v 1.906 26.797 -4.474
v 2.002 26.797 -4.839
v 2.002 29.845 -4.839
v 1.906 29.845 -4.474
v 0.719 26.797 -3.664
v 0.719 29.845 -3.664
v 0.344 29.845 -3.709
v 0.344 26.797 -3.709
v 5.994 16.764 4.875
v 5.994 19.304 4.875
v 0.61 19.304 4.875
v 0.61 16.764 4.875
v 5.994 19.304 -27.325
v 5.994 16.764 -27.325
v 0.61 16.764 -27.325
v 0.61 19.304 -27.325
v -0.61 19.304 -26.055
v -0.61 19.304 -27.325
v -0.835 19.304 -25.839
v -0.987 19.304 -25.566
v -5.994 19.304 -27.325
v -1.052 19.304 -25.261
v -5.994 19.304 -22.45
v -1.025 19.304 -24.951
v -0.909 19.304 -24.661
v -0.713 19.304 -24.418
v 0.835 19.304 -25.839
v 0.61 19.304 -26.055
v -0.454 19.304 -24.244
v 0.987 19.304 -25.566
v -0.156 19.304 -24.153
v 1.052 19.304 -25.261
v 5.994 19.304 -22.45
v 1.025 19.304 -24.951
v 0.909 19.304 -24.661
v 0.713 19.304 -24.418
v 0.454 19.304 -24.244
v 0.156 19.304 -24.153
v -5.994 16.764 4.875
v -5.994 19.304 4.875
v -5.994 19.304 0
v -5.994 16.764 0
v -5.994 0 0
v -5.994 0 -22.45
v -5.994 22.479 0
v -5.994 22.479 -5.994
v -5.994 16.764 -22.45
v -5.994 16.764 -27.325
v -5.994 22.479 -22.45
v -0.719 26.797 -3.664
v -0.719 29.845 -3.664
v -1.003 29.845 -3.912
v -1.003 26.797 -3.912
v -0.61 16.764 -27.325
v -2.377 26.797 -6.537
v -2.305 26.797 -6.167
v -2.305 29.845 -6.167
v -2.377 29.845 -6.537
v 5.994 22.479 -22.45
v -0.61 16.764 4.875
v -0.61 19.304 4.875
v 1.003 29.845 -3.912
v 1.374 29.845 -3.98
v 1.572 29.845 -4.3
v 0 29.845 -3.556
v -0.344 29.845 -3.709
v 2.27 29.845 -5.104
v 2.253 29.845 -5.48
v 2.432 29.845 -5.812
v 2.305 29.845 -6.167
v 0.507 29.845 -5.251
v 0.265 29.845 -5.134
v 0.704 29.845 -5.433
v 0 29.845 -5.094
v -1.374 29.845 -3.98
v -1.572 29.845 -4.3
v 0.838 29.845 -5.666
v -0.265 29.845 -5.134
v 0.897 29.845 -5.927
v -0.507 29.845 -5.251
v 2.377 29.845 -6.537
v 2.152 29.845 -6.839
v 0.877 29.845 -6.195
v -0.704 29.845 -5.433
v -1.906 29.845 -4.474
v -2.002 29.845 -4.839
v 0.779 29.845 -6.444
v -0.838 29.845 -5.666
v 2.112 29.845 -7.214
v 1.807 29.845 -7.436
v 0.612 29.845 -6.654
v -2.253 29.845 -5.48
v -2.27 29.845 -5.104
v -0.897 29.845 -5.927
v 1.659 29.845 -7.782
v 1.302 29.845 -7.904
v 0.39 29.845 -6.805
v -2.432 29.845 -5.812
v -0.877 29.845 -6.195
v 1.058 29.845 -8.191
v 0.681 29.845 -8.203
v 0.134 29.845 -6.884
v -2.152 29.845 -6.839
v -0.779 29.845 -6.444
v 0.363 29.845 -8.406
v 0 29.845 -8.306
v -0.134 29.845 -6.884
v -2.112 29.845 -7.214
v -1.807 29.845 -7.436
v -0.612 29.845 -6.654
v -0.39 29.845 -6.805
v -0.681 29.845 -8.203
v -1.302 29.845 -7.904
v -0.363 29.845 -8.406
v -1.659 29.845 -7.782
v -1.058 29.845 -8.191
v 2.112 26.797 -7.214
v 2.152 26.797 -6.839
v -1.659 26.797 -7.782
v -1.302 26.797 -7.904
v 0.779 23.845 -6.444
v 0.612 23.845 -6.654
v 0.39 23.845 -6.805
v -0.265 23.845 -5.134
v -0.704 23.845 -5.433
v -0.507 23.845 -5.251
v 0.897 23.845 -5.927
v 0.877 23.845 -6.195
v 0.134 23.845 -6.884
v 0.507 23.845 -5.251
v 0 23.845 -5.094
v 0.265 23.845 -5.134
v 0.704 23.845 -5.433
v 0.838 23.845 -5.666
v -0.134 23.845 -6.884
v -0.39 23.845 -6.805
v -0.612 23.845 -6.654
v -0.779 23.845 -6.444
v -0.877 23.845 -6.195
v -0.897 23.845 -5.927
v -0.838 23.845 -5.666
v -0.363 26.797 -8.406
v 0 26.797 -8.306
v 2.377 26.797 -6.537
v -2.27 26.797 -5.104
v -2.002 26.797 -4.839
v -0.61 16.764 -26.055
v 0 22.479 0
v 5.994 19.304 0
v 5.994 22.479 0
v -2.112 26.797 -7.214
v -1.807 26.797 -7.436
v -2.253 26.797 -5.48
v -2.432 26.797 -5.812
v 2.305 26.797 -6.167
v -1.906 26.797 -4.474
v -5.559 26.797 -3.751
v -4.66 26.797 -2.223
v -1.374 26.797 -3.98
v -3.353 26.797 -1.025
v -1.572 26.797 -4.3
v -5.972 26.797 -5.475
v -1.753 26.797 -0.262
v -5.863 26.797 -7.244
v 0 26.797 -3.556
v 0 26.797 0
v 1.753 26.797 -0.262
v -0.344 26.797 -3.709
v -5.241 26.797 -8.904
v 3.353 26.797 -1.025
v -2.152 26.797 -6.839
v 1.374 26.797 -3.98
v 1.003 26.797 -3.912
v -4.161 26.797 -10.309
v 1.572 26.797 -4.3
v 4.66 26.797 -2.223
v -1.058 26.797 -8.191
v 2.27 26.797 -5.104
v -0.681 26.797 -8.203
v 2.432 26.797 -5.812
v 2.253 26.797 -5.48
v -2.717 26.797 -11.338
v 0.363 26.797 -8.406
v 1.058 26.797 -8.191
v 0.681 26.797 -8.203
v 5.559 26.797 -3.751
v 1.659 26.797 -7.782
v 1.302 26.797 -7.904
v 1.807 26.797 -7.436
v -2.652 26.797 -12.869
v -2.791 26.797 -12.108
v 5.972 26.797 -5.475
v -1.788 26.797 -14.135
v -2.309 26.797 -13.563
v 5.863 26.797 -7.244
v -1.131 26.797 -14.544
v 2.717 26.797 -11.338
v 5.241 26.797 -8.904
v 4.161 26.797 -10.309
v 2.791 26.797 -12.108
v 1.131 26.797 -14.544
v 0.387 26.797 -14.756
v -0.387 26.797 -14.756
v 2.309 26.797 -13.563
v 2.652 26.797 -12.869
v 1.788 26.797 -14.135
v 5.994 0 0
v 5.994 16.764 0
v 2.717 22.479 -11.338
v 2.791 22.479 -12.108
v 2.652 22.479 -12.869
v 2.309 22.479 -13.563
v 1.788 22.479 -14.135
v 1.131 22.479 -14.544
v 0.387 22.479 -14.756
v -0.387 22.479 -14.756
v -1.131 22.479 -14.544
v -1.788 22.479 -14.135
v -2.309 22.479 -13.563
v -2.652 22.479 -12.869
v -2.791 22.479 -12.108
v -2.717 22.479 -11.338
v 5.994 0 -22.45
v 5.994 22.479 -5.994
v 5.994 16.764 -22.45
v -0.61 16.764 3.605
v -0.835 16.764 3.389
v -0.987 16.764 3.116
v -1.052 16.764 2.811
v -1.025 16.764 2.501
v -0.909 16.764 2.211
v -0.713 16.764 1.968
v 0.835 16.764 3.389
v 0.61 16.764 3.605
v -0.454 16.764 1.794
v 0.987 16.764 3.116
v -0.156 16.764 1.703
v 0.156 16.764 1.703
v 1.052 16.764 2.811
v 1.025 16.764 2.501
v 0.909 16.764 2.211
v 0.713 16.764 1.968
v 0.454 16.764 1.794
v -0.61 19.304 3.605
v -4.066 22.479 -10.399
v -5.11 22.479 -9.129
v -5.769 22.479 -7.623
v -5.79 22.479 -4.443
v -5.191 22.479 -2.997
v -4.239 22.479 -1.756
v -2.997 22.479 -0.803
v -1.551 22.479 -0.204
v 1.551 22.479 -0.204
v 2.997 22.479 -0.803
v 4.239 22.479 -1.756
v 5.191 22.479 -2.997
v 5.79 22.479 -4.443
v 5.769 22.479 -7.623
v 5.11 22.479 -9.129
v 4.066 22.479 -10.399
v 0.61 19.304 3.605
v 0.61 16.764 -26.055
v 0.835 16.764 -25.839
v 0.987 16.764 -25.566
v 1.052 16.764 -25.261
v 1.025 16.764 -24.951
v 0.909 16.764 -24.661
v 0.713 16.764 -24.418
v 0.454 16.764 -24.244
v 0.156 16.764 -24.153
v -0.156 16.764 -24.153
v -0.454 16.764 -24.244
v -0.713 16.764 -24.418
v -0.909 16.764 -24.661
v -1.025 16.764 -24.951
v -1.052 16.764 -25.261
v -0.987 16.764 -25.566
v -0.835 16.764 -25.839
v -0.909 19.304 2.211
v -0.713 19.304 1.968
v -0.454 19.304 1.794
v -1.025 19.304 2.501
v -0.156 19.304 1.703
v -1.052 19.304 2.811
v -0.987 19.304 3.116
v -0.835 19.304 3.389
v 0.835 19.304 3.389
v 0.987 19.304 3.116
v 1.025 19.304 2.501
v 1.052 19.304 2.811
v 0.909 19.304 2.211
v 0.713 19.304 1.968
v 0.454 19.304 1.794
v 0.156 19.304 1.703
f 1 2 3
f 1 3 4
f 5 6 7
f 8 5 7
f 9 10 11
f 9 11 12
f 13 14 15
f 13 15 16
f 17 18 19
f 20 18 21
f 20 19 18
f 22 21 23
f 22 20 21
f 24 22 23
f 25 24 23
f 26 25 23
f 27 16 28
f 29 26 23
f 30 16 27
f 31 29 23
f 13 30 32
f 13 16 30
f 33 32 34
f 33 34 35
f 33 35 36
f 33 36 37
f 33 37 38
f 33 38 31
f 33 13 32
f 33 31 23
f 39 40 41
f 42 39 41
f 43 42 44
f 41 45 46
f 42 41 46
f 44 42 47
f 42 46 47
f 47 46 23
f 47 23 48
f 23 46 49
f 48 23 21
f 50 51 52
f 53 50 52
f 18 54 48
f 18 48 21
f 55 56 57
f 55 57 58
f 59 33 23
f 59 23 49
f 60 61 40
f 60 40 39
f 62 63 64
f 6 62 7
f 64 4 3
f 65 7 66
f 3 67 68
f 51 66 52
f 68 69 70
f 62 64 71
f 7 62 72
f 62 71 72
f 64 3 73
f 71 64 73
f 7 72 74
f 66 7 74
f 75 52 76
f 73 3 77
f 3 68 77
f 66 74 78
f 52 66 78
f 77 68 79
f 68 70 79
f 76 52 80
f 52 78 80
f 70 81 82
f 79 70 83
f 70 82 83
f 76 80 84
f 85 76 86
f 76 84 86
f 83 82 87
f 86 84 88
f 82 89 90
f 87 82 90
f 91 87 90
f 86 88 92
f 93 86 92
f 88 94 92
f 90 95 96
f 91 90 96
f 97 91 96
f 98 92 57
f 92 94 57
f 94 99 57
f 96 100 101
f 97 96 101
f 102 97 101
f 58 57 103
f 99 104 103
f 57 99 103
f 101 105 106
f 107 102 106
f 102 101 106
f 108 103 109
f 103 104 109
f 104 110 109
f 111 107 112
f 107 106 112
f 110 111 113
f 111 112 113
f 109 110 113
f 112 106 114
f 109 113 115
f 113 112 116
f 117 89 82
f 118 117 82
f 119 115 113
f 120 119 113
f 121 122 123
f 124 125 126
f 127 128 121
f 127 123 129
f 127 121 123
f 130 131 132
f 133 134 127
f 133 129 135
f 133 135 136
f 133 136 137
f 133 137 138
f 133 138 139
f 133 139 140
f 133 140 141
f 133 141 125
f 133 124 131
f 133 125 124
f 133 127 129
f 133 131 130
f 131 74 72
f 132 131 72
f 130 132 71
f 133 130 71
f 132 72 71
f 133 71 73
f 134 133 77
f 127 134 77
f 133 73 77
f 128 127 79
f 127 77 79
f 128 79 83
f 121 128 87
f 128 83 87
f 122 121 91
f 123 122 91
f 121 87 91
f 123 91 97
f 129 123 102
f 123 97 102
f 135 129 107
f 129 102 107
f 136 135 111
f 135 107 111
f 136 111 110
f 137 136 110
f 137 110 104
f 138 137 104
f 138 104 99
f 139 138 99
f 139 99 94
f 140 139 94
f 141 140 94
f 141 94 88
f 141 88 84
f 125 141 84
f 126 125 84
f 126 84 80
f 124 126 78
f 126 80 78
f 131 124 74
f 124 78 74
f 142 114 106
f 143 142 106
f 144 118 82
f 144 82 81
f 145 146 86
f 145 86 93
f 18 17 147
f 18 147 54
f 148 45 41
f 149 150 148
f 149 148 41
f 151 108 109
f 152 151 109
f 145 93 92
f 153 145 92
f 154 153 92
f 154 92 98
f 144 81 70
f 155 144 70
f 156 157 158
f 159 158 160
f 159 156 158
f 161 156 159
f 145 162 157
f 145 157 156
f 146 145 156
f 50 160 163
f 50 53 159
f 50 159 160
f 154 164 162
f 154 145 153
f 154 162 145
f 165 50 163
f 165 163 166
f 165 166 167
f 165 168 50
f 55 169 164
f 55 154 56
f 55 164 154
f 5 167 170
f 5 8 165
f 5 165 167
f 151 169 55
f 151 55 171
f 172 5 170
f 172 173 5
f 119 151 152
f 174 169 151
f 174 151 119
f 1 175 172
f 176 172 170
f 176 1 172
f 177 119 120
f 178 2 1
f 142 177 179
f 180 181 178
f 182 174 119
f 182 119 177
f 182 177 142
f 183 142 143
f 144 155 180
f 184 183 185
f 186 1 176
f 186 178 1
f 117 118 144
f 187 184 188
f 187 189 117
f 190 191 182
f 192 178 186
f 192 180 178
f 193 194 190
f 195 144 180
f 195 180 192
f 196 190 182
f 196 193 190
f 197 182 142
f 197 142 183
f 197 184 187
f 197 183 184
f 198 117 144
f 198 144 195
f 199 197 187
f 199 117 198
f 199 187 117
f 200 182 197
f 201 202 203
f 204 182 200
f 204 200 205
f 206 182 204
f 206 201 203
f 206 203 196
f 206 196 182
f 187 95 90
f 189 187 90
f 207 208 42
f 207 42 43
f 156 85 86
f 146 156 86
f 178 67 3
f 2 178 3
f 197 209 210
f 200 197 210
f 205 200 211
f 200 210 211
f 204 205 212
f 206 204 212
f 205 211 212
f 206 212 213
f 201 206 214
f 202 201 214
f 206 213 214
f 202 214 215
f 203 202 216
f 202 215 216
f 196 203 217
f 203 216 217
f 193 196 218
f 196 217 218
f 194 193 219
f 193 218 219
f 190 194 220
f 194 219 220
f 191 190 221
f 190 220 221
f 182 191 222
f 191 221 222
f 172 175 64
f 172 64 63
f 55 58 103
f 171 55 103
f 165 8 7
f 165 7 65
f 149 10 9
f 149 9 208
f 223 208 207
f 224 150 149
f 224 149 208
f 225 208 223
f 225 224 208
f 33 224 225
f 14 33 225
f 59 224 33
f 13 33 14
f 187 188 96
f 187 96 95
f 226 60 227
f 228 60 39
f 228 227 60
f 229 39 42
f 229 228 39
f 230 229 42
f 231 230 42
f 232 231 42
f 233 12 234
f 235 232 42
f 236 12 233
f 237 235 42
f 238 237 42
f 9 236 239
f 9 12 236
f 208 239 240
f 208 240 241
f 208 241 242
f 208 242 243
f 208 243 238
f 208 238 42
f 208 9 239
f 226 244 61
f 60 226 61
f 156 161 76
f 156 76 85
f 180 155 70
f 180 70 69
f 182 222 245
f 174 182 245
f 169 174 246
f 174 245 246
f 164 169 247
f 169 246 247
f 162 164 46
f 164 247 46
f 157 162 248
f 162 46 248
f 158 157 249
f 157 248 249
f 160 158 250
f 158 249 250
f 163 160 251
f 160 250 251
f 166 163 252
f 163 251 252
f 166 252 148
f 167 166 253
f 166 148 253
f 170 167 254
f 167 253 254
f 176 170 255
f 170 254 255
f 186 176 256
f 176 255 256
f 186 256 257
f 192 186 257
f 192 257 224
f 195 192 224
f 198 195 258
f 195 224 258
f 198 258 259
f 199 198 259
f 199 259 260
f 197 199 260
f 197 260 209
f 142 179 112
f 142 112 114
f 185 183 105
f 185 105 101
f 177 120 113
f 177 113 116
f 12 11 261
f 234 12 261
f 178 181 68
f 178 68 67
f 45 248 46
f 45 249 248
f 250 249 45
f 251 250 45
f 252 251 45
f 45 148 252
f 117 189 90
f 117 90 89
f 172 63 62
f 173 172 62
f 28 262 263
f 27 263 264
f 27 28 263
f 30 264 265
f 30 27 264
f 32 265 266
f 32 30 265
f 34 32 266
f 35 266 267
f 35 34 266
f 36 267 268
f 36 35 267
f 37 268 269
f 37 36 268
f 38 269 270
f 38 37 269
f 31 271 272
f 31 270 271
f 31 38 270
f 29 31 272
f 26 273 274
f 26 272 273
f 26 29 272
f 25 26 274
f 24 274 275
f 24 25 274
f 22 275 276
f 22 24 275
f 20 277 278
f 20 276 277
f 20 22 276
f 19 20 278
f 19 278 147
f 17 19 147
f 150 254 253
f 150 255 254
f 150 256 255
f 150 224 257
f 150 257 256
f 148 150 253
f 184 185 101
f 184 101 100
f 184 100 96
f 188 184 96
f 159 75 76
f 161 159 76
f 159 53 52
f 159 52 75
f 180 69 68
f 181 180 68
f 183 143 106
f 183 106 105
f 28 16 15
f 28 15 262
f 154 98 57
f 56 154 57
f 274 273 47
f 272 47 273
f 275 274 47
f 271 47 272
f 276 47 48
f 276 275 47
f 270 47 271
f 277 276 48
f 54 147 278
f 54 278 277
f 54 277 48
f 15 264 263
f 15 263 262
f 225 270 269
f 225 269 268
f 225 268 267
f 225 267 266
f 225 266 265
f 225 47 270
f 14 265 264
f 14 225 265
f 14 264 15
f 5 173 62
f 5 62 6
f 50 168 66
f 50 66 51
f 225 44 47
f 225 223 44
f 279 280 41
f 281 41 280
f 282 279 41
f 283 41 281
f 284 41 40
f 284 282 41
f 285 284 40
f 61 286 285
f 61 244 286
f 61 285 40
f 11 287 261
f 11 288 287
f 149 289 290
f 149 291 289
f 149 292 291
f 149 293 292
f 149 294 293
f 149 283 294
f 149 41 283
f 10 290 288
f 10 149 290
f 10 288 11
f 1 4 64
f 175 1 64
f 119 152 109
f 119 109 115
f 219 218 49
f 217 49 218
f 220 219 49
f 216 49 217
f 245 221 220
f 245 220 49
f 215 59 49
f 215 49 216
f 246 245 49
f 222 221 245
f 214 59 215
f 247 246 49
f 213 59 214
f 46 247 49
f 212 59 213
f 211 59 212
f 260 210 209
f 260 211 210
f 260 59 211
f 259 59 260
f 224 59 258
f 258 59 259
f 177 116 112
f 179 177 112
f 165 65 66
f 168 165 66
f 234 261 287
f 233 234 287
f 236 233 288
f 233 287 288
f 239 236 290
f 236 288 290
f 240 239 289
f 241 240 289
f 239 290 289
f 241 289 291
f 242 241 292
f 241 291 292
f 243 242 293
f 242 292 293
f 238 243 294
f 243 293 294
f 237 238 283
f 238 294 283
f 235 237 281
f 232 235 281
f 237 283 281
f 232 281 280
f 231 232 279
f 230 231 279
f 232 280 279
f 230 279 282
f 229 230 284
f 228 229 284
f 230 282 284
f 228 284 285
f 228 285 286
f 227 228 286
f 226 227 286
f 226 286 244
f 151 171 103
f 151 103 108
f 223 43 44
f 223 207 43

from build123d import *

# Parameters (mm, degrees)
BOSS_EXTRUDE1_DEPTH = 5.9944
BOSS_EXTRUDE2_DEPTH = 4.318
BOSS_EXTRUDE3_DEPTH = 3.048
CIRPATTERN1_COUNT   = 21
SKETCH4_R           = 0.9
CUT_EXTRUDE1_DEPTH  = 6
CUT_EXTRUDE2_REACH  = 35.989


with BuildPart() as part:
    # Sketch1 → Boss-Extrude1 (new, symmetric)
    with BuildSketch(Plane(origin=(0, 0, 0), x_dir=(0, 0, -1), z_dir=(1, 0, 0))):
        Polygon((22.45, 16.764), (27.325, 16.764), (27.325, 19.304), (22.45, 19.304), (22.45, 22.479), (0, 22.479), (0, 19.304), (-4.875, 19.304), (-4.875, 16.764), (0, 16.764), (0, 0), (22.45, 0), align=None)
    extrude(amount=BOSS_EXTRUDE1_DEPTH, both=True)

    # Sketch2 → Boss-Extrude2 (add)
    with BuildSketch(Plane(origin=(0, 22.479, 0), x_dir=(1, 0, 0), z_dir=(0, 1, 0))):
        with BuildLine():
            ThreePointArc((-2.717065955, 11.337655932), (0, 0), (2.717065955, 11.337655932))
            ThreePointArc((2.717065955, 11.337655932), (0, 14.7828), (-2.717065955, 11.337655932))
        make_face()
    extrude(amount=BOSS_EXTRUDE2_DEPTH)

    # Sketch3 → Boss-Extrude3 (add)
    with BuildSketch(Plane(origin=(0, 26.797, 0), x_dir=(1, 0, 0), z_dir=(0, 1, 0))):
        Polygon((0, 5.9944), (0, 8.3058), (0.363424662, 8.405565087), (0.68129711, 8.203110983), align=None)
    boss_extrude3 = extrude(amount=BOSS_EXTRUDE3_DEPTH)

    # CirPattern1: Boss-Extrude3 ×21 about axis
    cirpattern1_axis = Axis((0, 0, -5.9944), (0, 1, 0))
    for i in range(1, CIRPATTERN1_COUNT):
        add(boss_extrude3.rotate(cirpattern1_axis, i * 360 / CIRPATTERN1_COUNT))

    # Sketch4 → Cut-Extrude1 (cut)
    with BuildSketch(Plane(origin=(0, 29.845, 0), x_dir=(1, 0, 0), z_dir=(0, 1, 0))):
        with Locations(Location((0, 5.9944, 0), (0, 0, 270))):
            Circle(SKETCH4_R)
    extrude(amount=-CUT_EXTRUDE1_DEPTH, mode=Mode.SUBTRACT)

    # Sketch5 → Cut-Extrude2 (cut, up to next)
    with BuildSketch(Plane(origin=(0, 19.304, 0), x_dir=(1, 0, 0), z_dir=(0, 1, 0)), mode=Mode.PRIVATE) as cut_extrude2_sk1:
        with BuildLine():
            Line((-0.6096, 26.054950376), (-0.6096, 27.325))
            Line((-0.6096, 27.325), (0.6096, 27.325))
            Line((0.6096, 27.325), (0.6096, 26.054950376))
            ThreePointArc((0.6096, 26.054950376), (0, 24.1409), (-0.6096, 26.054950376))
        make_face()
    cut_extrude2_tool1 = extrude(cut_extrude2_sk1.sketch, amount=-CUT_EXTRUDE2_REACH, mode=Mode.PRIVATE) & part.part
    # Sketch5 → Cut-Extrude2 (cut, up to next)
    with BuildSketch(Plane(origin=(0, 19.304, 0), x_dir=(1, 0, 0), z_dir=(0, 1, 0)), mode=Mode.PRIVATE) as cut_extrude2_sk2:
        with BuildLine():
            Line((-0.6096, -4.875), (0.6096, -4.875))
            Line((0.6096, -4.875), (0.6096, -3.604950376))
            ThreePointArc((0.6096, -3.604950376), (0, -1.6909), (-0.6096, -3.604950376))
            Line((-0.6096, -3.604950376), (-0.6096, -4.875))
        make_face()
    cut_extrude2_tool2 = extrude(cut_extrude2_sk2.sketch, amount=-CUT_EXTRUDE2_REACH, mode=Mode.PRIVATE) & part.part
    add(cut_extrude2_tool1.solids().sort_by_distance((0, 19.304, -25.638579))[0], mode=Mode.SUBTRACT)
    add(cut_extrude2_tool2.solids().sort_by_distance((0, 19.304, 3.188579))[0], mode=Mode.SUBTRACT)


solid = part.part
